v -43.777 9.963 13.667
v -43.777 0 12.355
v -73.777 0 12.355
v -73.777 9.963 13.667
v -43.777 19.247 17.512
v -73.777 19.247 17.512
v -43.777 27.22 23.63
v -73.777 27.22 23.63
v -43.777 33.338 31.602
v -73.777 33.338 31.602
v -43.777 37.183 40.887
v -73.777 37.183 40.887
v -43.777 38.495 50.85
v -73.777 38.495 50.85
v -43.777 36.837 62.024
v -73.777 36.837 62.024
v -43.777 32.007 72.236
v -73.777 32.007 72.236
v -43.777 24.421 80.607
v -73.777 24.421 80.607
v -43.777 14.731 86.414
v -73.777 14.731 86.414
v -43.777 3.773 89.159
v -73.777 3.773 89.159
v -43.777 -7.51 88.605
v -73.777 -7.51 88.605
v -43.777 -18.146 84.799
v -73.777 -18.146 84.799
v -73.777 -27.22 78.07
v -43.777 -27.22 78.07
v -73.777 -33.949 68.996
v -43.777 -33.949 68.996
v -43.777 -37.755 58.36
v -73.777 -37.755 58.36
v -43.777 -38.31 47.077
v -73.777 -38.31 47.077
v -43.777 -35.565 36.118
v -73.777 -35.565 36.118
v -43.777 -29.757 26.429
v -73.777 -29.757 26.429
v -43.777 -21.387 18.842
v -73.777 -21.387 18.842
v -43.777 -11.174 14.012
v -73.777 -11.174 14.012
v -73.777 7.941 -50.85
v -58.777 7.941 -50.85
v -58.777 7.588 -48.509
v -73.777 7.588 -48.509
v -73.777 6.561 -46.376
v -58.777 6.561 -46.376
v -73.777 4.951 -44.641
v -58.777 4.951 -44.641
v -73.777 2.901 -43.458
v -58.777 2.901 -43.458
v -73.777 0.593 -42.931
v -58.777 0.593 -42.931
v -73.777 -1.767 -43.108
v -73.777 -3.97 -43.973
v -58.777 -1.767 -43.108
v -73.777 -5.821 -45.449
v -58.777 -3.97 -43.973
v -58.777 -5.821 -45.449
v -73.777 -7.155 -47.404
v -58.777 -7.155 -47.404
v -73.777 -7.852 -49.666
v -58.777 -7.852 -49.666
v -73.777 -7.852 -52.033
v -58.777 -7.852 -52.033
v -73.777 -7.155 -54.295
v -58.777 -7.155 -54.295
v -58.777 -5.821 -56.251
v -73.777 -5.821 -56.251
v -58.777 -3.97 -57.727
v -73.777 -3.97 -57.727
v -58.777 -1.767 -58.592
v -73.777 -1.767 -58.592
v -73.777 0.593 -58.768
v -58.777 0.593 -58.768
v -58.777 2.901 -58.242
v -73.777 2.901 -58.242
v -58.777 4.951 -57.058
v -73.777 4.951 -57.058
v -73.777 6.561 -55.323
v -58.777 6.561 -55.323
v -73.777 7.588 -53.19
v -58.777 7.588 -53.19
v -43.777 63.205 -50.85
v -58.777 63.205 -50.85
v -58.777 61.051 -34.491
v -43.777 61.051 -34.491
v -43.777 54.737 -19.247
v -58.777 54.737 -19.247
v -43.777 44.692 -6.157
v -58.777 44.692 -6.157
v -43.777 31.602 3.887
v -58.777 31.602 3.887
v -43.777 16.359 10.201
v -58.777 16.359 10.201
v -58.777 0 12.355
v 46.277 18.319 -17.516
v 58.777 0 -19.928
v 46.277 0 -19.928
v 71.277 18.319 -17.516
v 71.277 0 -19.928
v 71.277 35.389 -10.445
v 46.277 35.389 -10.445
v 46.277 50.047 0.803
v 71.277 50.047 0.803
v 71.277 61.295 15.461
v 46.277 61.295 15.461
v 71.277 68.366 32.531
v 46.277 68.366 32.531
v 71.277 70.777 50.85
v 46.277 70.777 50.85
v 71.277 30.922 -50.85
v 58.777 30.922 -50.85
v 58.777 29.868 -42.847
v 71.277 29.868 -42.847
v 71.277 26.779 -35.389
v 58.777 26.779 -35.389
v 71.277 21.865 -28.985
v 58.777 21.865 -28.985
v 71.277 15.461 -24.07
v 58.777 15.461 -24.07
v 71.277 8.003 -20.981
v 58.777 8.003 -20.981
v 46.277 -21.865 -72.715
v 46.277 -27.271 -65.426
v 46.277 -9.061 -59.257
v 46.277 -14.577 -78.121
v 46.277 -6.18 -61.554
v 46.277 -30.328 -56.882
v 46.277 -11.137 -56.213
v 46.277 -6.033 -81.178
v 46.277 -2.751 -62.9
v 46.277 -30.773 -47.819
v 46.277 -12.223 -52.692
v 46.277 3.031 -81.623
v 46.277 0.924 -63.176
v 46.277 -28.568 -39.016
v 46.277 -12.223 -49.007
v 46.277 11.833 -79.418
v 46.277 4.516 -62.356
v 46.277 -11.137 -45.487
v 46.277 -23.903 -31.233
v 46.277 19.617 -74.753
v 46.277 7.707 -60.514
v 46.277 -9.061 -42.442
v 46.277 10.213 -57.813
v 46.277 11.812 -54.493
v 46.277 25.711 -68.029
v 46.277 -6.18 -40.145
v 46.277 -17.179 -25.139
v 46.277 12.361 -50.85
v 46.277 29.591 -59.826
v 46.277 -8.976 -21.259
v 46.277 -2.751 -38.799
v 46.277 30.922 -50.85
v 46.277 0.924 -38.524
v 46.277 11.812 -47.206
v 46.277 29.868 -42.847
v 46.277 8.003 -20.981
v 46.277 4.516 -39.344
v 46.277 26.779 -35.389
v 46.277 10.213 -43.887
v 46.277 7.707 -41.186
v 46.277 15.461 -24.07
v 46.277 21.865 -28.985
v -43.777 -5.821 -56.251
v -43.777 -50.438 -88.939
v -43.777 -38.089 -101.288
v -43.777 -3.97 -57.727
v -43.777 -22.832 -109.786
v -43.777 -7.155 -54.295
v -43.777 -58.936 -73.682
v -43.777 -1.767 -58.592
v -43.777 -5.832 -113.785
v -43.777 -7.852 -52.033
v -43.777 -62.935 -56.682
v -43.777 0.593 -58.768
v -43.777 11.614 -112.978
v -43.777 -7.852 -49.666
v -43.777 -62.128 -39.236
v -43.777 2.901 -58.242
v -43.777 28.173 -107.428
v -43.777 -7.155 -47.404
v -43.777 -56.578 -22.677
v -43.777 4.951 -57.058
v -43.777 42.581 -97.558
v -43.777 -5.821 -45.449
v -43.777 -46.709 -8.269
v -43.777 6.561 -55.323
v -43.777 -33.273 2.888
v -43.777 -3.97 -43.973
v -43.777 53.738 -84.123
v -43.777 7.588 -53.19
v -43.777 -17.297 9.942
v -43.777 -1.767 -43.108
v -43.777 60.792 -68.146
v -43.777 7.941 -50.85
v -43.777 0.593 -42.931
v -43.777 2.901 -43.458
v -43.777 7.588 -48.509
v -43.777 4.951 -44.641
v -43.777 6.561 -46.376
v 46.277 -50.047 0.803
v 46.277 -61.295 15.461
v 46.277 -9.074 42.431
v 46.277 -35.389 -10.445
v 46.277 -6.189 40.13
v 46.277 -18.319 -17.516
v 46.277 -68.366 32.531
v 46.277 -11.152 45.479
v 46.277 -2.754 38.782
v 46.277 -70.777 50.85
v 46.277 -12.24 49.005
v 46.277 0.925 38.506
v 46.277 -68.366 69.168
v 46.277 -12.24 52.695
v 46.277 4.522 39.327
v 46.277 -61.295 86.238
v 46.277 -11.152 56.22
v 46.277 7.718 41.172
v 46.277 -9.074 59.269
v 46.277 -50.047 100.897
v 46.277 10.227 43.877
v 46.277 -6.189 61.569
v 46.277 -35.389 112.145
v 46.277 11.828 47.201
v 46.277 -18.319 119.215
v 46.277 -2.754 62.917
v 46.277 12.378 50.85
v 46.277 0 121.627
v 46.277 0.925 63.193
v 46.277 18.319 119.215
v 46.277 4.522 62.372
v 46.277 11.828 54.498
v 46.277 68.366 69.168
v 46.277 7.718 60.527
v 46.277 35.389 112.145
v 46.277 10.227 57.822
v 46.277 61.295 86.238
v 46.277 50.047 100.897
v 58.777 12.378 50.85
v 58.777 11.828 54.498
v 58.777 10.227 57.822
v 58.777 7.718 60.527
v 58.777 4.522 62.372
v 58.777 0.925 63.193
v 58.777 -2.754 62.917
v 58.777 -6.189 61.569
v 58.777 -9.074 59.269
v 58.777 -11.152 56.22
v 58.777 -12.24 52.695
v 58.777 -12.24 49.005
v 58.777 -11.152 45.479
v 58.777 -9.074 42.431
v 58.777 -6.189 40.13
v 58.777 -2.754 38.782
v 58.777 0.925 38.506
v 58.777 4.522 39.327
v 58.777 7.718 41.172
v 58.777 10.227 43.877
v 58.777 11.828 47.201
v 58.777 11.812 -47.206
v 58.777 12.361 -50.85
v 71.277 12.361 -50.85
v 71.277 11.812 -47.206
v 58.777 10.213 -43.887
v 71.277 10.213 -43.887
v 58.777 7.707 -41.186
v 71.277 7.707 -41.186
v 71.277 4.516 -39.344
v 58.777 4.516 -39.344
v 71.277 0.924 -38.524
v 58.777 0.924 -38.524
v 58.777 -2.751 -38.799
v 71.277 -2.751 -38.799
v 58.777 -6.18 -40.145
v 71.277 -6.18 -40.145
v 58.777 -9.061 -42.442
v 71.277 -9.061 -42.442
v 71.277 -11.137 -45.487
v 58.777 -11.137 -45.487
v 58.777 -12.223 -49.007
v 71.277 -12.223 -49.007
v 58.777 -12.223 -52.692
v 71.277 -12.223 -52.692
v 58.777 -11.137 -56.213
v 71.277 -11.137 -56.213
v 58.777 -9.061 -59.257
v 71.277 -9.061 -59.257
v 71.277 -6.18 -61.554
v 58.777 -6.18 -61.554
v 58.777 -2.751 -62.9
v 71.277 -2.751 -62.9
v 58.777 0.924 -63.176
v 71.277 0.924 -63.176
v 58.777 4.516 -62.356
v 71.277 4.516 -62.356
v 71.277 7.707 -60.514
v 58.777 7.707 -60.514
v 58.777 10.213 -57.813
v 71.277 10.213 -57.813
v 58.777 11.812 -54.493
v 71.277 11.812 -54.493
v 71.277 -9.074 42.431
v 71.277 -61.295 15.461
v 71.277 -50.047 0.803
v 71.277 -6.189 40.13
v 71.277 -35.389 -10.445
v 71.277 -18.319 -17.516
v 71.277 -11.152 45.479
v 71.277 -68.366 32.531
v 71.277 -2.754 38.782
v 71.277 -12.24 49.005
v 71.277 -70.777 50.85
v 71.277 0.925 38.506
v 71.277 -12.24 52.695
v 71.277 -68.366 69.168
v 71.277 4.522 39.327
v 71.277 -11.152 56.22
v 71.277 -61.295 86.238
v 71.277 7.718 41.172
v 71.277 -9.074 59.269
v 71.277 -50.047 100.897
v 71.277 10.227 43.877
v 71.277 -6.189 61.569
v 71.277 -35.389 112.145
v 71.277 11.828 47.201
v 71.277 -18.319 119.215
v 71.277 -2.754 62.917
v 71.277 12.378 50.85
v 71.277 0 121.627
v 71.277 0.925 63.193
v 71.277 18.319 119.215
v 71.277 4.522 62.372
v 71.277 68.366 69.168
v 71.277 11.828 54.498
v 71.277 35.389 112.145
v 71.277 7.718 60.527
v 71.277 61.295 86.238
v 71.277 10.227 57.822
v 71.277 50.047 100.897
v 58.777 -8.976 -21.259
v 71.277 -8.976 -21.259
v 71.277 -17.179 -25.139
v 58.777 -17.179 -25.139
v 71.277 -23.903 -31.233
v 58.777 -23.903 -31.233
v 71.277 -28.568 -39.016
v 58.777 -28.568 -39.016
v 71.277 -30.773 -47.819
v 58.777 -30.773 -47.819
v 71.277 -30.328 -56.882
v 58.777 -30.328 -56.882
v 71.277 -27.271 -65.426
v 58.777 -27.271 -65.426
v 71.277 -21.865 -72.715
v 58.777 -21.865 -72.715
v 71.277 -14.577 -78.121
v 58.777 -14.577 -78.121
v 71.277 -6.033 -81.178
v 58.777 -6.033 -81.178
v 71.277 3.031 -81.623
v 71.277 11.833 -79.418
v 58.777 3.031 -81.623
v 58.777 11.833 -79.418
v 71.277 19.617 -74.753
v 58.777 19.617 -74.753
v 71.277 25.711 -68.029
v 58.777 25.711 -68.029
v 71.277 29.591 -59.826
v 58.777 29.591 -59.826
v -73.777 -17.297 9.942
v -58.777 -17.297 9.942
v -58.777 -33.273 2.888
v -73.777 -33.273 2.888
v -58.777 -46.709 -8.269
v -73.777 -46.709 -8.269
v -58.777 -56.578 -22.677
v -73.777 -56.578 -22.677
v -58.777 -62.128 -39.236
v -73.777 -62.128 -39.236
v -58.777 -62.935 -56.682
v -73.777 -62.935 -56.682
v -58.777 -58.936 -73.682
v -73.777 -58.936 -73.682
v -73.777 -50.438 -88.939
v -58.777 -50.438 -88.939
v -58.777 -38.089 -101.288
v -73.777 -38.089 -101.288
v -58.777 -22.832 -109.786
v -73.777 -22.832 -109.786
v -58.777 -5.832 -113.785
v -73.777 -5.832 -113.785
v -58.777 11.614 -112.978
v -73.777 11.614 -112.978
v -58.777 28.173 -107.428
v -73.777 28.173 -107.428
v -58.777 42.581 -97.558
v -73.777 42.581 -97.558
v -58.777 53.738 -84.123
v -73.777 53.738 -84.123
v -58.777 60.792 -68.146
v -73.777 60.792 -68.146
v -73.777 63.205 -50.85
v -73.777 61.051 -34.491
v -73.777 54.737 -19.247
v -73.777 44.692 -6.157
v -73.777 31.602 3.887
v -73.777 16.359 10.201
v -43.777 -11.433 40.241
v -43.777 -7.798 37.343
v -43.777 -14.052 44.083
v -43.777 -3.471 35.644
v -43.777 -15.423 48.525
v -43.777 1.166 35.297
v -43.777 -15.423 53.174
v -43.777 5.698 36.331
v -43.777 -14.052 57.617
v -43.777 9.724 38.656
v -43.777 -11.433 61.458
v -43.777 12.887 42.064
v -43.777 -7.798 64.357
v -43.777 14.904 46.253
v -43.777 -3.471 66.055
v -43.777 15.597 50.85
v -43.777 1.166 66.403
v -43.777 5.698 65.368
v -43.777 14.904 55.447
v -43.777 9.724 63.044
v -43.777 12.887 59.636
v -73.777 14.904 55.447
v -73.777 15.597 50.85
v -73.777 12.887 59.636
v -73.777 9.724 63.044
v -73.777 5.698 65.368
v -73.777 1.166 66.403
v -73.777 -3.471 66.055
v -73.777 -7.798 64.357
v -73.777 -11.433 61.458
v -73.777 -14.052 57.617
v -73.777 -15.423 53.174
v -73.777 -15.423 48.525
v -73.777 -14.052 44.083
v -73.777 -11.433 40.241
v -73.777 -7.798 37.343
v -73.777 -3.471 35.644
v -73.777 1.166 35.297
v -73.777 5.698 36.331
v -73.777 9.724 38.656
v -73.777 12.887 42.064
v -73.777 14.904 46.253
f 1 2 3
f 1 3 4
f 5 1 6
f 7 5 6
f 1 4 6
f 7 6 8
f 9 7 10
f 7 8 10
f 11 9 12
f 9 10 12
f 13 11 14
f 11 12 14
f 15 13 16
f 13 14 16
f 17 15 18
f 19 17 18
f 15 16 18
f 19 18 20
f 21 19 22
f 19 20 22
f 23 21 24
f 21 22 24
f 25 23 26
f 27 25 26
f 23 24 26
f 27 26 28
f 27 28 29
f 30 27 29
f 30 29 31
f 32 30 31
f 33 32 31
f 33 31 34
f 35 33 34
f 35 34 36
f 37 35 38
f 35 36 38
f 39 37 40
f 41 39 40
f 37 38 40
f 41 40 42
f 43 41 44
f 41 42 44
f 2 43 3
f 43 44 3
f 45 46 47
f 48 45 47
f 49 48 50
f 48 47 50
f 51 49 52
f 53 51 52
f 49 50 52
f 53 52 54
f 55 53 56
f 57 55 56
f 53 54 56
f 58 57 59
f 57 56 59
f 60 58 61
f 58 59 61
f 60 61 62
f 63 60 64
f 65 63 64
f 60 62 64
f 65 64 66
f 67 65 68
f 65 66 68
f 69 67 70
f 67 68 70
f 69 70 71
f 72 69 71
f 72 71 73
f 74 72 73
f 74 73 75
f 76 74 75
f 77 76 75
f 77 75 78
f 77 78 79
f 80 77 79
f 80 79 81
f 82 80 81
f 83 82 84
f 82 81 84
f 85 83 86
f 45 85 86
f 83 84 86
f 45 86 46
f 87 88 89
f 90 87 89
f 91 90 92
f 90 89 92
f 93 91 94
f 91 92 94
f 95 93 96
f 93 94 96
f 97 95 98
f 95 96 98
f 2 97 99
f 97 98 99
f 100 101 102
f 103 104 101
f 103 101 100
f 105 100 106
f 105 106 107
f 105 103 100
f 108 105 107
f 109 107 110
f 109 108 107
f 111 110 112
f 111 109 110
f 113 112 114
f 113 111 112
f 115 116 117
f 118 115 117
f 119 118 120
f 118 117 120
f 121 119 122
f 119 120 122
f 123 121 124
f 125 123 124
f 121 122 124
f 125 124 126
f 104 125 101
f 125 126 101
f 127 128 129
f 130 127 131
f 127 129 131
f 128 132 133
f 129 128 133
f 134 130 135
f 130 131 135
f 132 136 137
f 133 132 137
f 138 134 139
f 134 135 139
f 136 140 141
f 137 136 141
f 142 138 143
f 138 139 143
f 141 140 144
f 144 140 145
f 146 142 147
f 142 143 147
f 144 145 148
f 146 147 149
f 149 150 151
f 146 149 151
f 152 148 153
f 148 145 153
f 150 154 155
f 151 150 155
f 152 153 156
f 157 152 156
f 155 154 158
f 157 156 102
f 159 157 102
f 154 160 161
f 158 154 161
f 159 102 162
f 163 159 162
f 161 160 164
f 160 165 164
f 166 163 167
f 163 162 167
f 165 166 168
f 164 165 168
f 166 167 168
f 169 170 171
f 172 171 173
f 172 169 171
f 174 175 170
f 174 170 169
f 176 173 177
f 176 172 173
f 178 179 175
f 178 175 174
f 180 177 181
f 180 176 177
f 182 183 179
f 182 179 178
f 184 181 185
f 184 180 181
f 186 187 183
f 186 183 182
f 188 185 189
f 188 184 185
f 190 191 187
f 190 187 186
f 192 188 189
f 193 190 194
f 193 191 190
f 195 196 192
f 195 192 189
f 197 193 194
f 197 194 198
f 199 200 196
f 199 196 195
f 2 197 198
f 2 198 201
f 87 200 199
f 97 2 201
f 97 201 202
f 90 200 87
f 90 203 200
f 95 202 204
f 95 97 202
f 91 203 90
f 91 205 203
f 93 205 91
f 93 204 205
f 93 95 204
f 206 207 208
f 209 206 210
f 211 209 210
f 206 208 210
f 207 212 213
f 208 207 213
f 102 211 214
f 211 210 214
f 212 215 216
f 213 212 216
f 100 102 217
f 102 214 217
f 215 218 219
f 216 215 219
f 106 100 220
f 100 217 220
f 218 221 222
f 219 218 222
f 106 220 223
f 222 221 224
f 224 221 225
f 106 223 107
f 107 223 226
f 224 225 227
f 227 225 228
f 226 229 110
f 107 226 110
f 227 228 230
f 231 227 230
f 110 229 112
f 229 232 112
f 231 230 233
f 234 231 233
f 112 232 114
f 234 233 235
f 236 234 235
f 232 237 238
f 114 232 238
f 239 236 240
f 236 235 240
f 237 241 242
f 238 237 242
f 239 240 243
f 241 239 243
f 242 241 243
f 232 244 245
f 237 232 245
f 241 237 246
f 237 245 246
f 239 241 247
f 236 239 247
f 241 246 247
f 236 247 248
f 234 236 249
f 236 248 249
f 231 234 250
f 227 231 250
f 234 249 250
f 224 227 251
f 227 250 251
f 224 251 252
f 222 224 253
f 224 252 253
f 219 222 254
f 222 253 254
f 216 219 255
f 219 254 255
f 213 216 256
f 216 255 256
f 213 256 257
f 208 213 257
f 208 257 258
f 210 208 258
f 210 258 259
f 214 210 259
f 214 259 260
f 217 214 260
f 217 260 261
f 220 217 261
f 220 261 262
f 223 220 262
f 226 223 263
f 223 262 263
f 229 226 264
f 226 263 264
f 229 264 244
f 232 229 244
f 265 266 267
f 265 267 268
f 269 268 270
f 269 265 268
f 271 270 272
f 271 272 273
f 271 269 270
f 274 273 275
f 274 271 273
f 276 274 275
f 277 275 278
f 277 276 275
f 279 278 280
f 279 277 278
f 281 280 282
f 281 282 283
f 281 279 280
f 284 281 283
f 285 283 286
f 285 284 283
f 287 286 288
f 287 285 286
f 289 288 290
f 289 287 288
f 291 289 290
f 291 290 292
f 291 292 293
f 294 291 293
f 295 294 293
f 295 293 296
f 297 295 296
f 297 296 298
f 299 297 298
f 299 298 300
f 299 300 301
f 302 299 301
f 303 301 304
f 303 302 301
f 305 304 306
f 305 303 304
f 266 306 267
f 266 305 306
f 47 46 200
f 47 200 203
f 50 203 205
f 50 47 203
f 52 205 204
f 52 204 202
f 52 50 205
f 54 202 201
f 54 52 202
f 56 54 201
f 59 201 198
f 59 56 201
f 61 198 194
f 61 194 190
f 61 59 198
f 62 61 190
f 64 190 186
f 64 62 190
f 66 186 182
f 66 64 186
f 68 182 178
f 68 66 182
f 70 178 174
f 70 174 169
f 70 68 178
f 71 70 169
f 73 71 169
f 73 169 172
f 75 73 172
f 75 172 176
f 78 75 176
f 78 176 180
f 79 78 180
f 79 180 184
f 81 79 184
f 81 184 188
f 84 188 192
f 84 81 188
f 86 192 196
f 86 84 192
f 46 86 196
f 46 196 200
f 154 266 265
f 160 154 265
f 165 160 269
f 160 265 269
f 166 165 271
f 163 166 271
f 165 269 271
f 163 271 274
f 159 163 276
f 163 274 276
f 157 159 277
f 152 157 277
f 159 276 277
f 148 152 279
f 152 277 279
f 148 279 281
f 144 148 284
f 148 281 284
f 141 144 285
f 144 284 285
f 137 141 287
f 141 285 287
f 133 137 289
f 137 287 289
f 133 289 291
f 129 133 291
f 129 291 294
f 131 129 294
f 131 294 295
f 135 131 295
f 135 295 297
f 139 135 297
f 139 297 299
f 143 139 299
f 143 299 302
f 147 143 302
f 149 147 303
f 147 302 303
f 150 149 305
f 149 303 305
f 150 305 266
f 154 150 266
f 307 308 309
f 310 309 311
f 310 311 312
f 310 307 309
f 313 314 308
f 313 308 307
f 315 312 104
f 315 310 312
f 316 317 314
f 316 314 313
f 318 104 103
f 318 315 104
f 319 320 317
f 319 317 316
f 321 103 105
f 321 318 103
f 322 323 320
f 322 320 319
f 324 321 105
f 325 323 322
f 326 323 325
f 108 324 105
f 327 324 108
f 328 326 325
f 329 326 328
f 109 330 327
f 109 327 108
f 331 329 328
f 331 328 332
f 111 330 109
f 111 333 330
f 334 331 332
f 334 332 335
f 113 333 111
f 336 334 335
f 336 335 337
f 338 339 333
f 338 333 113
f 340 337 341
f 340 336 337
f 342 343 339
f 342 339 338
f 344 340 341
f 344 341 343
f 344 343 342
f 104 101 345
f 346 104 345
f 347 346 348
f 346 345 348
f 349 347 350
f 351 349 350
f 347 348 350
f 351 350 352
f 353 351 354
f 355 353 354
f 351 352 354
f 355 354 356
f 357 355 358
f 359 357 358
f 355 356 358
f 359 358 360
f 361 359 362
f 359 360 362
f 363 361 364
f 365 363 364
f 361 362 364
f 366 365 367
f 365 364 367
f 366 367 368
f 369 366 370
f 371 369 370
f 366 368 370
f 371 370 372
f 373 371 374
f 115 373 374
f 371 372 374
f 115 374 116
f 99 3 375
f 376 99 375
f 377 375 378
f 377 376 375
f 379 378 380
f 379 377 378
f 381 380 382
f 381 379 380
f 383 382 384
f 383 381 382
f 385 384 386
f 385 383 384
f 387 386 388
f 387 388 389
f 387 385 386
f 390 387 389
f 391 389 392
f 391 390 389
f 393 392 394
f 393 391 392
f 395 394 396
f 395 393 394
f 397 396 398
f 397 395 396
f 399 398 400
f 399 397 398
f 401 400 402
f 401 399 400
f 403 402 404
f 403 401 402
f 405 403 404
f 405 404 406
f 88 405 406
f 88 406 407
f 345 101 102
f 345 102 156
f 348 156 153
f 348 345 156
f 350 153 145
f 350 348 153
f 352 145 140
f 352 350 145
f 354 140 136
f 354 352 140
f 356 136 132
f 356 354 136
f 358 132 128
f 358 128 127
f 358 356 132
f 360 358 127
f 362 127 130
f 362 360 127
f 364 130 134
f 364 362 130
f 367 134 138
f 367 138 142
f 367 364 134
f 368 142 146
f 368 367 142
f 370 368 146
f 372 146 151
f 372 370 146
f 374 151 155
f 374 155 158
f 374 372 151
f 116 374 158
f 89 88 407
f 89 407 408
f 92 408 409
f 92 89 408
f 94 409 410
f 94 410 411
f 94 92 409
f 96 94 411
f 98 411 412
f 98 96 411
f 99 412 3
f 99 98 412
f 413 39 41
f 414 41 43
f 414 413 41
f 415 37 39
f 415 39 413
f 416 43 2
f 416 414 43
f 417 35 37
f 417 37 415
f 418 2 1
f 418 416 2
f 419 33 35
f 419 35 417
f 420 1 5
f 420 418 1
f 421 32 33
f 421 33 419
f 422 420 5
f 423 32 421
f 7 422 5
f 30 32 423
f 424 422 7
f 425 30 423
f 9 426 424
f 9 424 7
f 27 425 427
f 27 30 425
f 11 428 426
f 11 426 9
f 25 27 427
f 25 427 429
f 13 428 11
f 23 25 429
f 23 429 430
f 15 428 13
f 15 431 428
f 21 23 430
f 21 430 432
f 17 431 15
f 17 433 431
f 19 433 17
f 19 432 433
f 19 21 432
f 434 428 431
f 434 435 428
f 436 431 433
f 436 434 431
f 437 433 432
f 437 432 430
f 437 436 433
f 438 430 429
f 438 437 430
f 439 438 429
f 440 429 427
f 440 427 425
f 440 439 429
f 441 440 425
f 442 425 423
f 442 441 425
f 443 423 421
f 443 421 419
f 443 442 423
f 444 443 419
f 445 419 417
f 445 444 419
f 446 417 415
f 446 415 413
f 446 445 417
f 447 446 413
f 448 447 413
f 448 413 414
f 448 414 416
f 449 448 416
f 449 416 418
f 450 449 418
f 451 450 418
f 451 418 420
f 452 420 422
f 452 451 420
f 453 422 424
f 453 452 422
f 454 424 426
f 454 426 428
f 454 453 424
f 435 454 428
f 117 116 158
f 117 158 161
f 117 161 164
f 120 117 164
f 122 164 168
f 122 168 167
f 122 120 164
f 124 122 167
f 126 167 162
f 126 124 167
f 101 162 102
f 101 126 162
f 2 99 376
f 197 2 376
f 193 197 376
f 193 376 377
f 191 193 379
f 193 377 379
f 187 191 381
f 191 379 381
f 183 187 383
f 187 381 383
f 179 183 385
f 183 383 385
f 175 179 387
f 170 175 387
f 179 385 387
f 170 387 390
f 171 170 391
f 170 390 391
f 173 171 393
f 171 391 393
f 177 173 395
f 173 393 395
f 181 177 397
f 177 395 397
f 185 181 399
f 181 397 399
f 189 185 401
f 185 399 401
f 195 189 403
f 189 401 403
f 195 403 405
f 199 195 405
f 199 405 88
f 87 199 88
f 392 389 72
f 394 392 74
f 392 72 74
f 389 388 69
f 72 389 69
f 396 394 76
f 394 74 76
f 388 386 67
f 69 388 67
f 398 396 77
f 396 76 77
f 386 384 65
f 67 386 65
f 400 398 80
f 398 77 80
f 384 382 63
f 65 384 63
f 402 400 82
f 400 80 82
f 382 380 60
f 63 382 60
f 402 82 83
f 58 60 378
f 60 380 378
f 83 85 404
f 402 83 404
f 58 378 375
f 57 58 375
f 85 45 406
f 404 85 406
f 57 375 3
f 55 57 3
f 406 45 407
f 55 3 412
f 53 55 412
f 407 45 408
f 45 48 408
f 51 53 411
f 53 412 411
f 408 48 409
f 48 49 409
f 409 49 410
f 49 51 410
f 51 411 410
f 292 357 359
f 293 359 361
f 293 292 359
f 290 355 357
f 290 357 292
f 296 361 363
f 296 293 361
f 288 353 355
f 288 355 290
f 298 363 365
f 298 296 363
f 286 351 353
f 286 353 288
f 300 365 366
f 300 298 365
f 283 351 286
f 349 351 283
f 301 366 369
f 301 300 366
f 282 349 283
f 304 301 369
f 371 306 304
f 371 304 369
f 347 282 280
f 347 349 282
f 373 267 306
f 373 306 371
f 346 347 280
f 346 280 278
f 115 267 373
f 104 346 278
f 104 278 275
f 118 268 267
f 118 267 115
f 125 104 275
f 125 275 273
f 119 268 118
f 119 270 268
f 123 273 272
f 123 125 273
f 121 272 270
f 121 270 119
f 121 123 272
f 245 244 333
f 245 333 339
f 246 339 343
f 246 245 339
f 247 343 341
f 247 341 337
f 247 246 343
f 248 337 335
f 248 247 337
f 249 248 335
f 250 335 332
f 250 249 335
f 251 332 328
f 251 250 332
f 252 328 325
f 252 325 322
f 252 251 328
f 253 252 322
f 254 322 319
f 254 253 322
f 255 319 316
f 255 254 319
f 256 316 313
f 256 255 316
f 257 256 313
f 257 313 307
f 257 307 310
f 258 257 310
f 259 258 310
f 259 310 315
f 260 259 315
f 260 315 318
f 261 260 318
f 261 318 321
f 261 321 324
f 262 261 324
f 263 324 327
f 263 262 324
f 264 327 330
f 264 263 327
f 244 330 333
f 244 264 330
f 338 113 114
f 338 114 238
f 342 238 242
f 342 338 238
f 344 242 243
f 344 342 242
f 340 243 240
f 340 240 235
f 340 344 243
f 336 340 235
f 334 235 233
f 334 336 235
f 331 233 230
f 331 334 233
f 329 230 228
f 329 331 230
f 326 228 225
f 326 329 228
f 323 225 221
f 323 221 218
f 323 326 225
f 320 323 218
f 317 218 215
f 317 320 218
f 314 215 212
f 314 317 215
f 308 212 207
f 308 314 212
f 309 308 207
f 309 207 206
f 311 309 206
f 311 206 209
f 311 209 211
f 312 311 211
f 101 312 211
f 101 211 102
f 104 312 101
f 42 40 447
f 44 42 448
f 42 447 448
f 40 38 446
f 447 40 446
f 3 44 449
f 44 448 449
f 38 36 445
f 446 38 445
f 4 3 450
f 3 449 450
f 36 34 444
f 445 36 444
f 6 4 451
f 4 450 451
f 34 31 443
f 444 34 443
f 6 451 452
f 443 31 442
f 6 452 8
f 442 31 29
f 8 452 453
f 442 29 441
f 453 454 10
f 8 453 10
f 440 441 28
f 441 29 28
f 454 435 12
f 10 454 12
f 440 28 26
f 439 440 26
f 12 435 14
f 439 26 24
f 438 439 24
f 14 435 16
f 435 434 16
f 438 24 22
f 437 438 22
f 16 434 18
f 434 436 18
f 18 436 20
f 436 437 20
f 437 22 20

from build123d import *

# Parameters (mm, degrees)
F2_R          = 7.9409001723
F5_DEPTH      = 15
F2_R_2        = 15.5967497012
F6_DEPTH      = 15
F6_DEPTH_BACK = 15
F4_R          = 12.3606629879
F7_DEPTH      = 12.5
F4_R_2        = 12.3779516433
F8_DEPTH      = 12.5


with BuildPart() as f5:
    # F2 (on plane+point) → F5 (new body, symmetric)
    with BuildSketch(Plane.YZ.offset(-58.7768666446)):
        with BuildLine():
            ThreePointArc((63.2045566431, -50.8497282863), (44.6923705955, -6.1573576734), (-2.45e-08, 12.3548283568))
            ThreePointArc((-2.45e-08, 12.3548283568), (-44.6923705955, -95.5420988992), (63.2045566431, -50.8497282863))
        make_face()
        with Locations((0, -50.8497282863)):
            Circle(F2_R, mode=Mode.SUBTRACT)
    extrude(amount=F5_DEPTH, both=True)


with BuildPart() as f6:
    # F2 (on plane+point) → F6 (new body, two sides)
    with BuildSketch(Plane.YZ.offset(-58.7768666446)) as f6_sk:
        with BuildLine():
            ThreePointArc((-2.45e-08, 12.3548283568), (27.2200047725, 23.6297234964), (38.4948999294, 50.8497282863))
            ThreePointArc((38.4948999294, 50.8497282863), (-27.2200047725, 78.0697330761), (-2.45e-08, 12.3548283568))
        make_face()
        with Locations((0, 50.8497282863)):
            Circle(F2_R_2, mode=Mode.SUBTRACT)
    extrude(amount=-F6_DEPTH)
    extrude(f6_sk.sketch, amount=F6_DEPTH_BACK)


with BuildPart() as f7:
    # F4 (on plane+point) → F7 (new body, symmetric)
    with BuildSketch(Plane.YZ.offset(58.7768666446)):
        with BuildLine():
            ThreePointArc((30.9220062538, -50.8497282863), (21.8651603136, -28.98456798), (1.04e-08, -19.9277220325))
            ThreePointArc((1.04e-08, -19.9277220325), (-21.8651603136, -72.7148885925), (30.9220062538, -50.8497282863))
        make_face()
        with Locations((0, -50.8497282863)):
            Circle(F4_R, mode=Mode.SUBTRACT)
    extrude(amount=F7_DEPTH, both=True)

    # F4 (on plane+point) → F8 (join, symmetric)
    with BuildSketch(Plane.YZ.offset(58.7768666446)):
        with BuildLine():
            ThreePointArc((1.04e-08, -19.9277220325), (50.0472150791, 0.8025132145), (70.7774503187, 50.8497282863))
            ThreePointArc((70.7774503187, 50.8497282863), (-50.0472150791, 100.896943358), (1.04e-08, -19.9277220325))
        make_face()
        with Locations((0, 50.8497282863)):
            Circle(F4_R_2, mode=Mode.SUBTRACT)
    extrude(amount=F8_DEPTH, both=True)


solid = Compound([f5.part, f6.part, f7.part])
